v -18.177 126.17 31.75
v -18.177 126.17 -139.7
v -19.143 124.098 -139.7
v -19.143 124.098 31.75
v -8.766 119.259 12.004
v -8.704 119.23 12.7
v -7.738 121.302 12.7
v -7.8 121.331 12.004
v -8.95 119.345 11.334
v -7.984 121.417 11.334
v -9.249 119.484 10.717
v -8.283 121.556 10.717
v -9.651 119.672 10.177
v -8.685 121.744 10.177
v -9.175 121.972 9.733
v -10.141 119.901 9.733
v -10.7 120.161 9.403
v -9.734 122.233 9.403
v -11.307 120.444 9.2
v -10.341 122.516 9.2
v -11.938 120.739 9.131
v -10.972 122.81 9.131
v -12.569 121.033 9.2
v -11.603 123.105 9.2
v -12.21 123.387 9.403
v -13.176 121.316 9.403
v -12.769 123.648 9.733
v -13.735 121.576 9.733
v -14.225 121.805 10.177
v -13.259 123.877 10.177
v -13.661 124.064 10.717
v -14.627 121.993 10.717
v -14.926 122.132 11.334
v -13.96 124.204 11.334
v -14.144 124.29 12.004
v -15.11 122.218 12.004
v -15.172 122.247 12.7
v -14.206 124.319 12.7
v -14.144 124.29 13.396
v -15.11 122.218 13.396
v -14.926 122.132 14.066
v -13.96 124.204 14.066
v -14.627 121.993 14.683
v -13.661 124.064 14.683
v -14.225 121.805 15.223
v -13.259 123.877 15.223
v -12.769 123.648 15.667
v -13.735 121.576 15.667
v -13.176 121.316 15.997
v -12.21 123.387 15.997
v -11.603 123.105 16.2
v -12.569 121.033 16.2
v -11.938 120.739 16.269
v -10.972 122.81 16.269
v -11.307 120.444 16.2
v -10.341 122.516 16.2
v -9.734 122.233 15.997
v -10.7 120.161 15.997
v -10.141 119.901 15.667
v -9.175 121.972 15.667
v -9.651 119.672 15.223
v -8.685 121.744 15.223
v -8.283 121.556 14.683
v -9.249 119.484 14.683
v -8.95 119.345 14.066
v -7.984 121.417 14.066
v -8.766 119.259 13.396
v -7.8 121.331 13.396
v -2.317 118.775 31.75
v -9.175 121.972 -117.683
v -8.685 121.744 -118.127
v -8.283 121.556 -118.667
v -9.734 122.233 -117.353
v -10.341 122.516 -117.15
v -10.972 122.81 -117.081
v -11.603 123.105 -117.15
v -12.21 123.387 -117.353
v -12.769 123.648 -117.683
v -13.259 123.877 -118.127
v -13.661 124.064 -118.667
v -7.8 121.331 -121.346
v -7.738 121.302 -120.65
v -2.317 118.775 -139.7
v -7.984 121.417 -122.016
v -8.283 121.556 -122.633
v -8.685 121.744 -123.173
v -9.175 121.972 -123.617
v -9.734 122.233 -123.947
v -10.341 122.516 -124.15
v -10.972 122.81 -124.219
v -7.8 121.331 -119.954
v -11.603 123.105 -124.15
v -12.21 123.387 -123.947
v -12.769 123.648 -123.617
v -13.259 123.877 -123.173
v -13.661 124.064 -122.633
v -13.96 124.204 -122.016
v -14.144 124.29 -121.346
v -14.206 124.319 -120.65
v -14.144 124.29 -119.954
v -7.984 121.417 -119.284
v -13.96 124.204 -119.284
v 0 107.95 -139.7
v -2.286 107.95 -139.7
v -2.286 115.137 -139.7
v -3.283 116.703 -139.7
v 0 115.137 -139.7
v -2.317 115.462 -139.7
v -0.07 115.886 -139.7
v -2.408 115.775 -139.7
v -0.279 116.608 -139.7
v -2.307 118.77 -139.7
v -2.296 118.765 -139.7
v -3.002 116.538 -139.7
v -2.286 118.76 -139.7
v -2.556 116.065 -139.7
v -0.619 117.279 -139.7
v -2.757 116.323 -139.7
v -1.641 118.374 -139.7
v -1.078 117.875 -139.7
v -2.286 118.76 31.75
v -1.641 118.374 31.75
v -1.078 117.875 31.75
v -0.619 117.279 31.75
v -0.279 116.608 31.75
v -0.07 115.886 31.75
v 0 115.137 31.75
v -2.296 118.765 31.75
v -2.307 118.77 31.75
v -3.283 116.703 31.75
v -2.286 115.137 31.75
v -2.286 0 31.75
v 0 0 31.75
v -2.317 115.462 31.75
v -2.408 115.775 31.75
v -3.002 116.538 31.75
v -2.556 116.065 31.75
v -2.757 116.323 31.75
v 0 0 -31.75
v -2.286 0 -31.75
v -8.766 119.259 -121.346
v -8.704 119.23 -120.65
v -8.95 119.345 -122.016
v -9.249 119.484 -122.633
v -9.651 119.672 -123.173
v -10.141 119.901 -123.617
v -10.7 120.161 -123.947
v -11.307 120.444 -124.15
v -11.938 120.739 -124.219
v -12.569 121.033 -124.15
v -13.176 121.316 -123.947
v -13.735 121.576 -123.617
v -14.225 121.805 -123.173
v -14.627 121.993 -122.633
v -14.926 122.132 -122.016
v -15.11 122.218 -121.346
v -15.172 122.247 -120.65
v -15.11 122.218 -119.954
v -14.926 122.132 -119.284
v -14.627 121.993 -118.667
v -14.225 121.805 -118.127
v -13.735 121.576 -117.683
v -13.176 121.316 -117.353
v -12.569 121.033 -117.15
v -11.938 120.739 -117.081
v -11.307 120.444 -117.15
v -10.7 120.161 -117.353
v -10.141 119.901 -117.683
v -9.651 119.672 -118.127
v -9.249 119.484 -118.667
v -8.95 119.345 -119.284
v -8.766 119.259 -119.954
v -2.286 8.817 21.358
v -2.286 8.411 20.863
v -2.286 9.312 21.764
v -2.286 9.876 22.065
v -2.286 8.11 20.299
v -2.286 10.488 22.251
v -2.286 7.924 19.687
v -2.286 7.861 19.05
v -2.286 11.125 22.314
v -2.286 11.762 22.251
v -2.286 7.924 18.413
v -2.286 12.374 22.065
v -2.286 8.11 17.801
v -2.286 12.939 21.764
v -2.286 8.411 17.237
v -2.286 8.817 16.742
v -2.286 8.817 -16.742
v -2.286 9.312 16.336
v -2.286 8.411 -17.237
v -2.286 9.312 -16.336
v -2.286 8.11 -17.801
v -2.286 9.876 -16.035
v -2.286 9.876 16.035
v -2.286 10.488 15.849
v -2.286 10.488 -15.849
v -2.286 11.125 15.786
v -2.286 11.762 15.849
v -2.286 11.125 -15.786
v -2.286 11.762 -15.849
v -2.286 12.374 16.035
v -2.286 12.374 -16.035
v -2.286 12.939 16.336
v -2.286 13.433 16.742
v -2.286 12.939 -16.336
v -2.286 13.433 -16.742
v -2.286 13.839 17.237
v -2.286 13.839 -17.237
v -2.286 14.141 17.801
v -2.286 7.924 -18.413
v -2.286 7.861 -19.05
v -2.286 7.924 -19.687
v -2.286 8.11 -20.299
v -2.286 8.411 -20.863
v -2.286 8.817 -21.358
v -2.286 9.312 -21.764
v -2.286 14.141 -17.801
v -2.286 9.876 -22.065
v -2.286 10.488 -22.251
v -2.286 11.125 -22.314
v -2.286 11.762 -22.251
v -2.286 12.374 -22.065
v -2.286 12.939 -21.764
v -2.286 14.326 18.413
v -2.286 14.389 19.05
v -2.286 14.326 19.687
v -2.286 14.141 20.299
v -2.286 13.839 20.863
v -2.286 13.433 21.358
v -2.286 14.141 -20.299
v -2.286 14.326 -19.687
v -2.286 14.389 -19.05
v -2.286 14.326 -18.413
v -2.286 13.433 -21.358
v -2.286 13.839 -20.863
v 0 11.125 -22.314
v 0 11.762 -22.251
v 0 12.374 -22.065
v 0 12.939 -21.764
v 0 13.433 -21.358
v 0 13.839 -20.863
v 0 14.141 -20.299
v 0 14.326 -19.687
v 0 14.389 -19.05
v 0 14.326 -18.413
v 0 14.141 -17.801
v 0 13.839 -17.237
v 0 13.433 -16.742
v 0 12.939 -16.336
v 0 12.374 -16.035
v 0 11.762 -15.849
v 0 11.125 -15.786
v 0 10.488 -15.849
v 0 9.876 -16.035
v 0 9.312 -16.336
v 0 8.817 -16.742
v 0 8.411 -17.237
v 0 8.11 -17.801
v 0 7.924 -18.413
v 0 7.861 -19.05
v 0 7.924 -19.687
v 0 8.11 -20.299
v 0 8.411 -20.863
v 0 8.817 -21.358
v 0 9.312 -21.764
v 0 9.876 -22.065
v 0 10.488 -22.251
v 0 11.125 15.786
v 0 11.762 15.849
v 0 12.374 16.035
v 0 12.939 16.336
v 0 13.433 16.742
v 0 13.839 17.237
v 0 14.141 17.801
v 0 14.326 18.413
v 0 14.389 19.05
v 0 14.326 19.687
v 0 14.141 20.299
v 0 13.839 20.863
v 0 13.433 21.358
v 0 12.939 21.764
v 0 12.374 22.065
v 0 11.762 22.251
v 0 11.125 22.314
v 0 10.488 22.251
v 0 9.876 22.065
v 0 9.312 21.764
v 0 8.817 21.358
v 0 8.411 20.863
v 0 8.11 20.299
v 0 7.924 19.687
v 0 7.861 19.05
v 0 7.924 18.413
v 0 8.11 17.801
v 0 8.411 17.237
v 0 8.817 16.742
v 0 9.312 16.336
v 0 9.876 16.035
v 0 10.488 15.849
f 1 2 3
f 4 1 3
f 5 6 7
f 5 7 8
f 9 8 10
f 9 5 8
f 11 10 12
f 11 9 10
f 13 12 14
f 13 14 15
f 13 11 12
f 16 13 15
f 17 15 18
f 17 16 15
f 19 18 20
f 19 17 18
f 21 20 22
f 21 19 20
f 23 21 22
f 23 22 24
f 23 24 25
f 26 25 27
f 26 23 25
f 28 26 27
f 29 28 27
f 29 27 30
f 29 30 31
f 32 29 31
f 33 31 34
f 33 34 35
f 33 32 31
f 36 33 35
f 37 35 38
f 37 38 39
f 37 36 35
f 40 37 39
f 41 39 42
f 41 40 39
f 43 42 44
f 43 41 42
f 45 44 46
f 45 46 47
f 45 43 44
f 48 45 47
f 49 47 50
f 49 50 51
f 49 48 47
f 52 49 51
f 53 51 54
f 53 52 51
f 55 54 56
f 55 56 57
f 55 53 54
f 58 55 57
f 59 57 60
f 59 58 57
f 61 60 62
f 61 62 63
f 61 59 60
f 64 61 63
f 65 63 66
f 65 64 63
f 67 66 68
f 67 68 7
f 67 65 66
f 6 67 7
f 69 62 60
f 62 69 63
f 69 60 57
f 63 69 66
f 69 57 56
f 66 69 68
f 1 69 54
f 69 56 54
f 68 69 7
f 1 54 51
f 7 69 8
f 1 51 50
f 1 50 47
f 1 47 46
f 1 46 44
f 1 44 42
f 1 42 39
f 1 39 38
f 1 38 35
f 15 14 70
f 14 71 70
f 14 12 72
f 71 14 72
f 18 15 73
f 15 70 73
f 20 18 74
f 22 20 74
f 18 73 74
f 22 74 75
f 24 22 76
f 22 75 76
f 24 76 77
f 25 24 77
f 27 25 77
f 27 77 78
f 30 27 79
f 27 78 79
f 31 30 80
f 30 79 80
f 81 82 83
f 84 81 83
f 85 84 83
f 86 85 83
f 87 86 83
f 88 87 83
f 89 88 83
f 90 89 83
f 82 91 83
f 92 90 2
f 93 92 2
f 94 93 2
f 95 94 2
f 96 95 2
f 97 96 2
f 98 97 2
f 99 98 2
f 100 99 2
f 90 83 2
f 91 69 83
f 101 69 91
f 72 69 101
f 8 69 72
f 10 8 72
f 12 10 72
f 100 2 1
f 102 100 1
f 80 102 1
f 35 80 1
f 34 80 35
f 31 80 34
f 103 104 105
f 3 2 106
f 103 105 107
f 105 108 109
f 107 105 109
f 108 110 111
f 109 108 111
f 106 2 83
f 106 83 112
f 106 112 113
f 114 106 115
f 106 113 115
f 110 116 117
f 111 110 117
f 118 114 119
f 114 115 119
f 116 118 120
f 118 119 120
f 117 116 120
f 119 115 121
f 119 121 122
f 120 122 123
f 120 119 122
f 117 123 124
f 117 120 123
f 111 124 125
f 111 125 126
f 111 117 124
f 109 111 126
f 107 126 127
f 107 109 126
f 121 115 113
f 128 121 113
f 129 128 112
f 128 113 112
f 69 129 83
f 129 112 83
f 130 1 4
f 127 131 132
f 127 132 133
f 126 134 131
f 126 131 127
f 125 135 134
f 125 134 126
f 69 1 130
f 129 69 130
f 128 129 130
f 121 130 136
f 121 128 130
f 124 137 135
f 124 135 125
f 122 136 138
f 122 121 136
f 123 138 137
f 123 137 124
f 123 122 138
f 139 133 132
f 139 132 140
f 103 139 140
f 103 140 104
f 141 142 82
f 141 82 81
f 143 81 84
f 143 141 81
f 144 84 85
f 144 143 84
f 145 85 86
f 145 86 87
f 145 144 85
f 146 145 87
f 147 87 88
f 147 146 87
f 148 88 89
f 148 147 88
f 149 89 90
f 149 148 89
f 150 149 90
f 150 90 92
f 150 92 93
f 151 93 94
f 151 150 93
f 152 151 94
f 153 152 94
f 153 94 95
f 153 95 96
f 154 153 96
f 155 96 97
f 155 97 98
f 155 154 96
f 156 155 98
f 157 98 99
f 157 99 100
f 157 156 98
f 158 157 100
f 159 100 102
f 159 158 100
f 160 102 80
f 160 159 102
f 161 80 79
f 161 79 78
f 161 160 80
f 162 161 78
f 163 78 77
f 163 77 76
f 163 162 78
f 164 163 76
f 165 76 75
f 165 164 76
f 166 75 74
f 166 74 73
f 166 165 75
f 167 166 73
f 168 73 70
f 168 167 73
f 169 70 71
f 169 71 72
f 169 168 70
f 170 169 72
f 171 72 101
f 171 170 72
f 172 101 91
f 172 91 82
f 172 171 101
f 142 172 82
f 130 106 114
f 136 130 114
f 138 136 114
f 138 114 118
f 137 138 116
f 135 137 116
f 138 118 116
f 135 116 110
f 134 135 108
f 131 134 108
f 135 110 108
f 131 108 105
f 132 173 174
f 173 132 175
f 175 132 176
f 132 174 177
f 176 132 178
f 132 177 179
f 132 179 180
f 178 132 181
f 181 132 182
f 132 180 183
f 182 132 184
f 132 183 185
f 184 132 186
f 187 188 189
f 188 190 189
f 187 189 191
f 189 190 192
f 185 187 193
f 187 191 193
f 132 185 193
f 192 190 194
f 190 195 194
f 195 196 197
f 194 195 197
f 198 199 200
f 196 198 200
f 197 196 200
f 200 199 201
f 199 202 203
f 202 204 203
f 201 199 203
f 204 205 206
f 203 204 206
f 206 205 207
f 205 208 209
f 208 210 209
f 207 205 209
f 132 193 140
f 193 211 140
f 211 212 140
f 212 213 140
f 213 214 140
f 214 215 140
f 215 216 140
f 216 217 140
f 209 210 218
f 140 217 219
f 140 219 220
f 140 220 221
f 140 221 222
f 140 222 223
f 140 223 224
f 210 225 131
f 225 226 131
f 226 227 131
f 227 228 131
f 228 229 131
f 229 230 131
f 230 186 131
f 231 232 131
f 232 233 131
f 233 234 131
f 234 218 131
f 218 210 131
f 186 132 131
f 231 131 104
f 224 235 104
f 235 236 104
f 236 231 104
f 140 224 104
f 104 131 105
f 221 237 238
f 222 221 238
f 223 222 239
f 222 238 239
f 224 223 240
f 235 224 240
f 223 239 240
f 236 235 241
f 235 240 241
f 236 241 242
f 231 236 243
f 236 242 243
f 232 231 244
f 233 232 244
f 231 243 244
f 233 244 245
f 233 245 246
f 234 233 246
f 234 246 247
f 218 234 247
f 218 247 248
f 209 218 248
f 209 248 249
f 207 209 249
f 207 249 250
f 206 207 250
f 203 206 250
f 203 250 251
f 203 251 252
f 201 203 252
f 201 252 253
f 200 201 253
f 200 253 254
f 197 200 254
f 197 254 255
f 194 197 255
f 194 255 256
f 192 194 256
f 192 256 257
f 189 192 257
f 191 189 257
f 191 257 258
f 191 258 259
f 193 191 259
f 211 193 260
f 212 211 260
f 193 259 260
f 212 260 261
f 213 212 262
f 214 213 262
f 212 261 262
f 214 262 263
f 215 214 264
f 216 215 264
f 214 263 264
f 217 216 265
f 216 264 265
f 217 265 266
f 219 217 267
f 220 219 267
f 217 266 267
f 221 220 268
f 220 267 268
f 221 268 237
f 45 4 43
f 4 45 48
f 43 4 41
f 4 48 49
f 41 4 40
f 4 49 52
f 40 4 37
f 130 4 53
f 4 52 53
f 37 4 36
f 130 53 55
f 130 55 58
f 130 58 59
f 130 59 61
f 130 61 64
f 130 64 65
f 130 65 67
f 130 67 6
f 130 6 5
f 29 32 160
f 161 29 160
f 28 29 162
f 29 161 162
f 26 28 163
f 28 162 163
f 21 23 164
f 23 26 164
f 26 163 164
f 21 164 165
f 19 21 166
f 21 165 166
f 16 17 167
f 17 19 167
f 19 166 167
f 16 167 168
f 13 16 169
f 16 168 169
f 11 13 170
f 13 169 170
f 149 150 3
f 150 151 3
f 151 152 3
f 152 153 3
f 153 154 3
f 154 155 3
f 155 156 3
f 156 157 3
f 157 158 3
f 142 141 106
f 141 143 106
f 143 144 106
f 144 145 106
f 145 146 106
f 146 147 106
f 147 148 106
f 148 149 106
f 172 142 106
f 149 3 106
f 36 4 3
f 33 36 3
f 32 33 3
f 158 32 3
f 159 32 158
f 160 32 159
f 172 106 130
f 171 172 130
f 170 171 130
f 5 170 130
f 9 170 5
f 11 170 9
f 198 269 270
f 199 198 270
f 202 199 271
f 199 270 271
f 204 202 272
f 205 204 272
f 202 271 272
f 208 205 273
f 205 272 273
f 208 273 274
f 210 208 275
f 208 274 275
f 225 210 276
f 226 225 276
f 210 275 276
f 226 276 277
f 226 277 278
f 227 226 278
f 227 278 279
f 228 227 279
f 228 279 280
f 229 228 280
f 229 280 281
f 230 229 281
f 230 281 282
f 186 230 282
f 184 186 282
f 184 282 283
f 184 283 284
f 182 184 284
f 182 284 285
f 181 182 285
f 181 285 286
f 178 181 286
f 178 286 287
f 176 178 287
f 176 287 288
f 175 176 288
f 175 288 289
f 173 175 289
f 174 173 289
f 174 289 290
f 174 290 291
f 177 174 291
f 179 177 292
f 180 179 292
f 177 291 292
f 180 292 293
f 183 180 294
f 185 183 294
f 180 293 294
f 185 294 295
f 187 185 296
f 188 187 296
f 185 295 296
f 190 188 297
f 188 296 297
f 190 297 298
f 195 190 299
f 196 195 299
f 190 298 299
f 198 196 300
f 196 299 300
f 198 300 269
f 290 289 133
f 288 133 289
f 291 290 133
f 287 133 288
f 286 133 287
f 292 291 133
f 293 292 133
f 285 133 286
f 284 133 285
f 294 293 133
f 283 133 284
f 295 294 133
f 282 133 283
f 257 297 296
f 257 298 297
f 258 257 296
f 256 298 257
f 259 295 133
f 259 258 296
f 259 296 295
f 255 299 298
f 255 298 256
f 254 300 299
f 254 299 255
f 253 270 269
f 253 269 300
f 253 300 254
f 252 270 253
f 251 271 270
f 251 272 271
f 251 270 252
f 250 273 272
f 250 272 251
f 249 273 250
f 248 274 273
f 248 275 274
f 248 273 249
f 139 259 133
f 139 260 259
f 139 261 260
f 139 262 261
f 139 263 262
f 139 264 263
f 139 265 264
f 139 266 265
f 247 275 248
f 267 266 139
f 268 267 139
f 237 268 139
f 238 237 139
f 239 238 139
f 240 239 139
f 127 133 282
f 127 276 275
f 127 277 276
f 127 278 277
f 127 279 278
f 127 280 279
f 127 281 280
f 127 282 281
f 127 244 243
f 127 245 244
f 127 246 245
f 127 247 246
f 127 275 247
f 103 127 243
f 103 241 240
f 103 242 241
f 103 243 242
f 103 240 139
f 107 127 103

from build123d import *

# Parameters (mm, degrees)
BASE_FLANGE1_DEPTH         = 2.286
CUT_EXTRUDE1_REACH         = 196.797
SKETCH4_R                  = 3.2639
SKETCH4_R_2                = 3.5687
SKETCHED_START             = 119.049056405
SKETCHED_BEND2_OUTLINE_R   = 3.5687
SKETCHED_BEND2_DEPTH       = 4.950943595
SKETCHED_START_2           = -139.7
SKETCHED_BEND2_2_DEPTH     = 171.45
SKETCHED_BEND2_3_DEPTH     = 171.45
SKETCHED_START_3           = 104.381009176
SKETCHED_BEND2_4_OUTLINE_R = 3.5687
SKETCHED_BEND2_4_DEPTH     = 2.286


with BuildPart() as part:
    # Base-Flange1: sheet metal written as solids
    # Sketch2 → Base-Flange1 (new body)
    with BuildSketch(Plane(origin=(0, 0, 0), x_dir=(0, 0, -1), z_dir=(1, 0, 0))):
        Polygon((-31.75, 0), (31.75, 0), (139.7, 107.95), (139.7, 135.7376), (-31.75, 135.7376), align=None)
    extrude(amount=-BASE_FLANGE1_DEPTH)

    # Sketch4 → Cut-Extrude1 (cut, up to next)
    with BuildSketch(Plane(origin=(0, 0, 0), x_dir=(0, 0, -1), z_dir=(1, 0, 0)), mode=Mode.PRIVATE) as cut_extrude1_sk1:
        with Locations((19.05, 11.1252)):
            Circle(SKETCH4_R)
    cut_extrude1_tool1 = extrude(cut_extrude1_sk1.sketch, amount=-CUT_EXTRUDE1_REACH, mode=Mode.PRIVATE) & part.part
    # Sketch4 → Cut-Extrude1 (cut, up to next)
    with BuildSketch(Plane(origin=(0, 0, 0), x_dir=(0, 0, -1), z_dir=(1, 0, 0)), mode=Mode.PRIVATE) as cut_extrude1_sk2:
        with Locations((-19.05, 11.1252)):
            Circle(SKETCH4_R)
    cut_extrude1_tool2 = extrude(cut_extrude1_sk2.sketch, amount=-CUT_EXTRUDE1_REACH, mode=Mode.PRIVATE) & part.part
    # Sketch4 → Cut-Extrude1 (cut, up to next)
    with BuildSketch(Plane(origin=(0, 0, 0), x_dir=(0, 0, -1), z_dir=(1, 0, 0)), mode=Mode.PRIVATE) as cut_extrude1_sk3:
        with Locations((-12.7, 127.7874)):
            Circle(SKETCH4_R_2)
    cut_extrude1_tool3 = extrude(cut_extrude1_sk3.sketch, amount=-CUT_EXTRUDE1_REACH, mode=Mode.PRIVATE) & part.part
    # Sketch4 → Cut-Extrude1 (cut, up to next)
    with BuildSketch(Plane(origin=(0, 0, 0), x_dir=(0, 0, -1), z_dir=(1, 0, 0)), mode=Mode.PRIVATE) as cut_extrude1_sk4:
        with Locations((120.65, 127.7874)):
            Circle(SKETCH4_R_2)
    cut_extrude1_tool4 = extrude(cut_extrude1_sk4.sketch, amount=-CUT_EXTRUDE1_REACH, mode=Mode.PRIVATE) & part.part
    add(cut_extrude1_tool1.solids().sort_by_distance((0, 11.1252, -19.05))[0], mode=Mode.SUBTRACT)
    add(cut_extrude1_tool2.solids().sort_by_distance((0, 11.1252, 19.05))[0], mode=Mode.SUBTRACT)
    add(cut_extrude1_tool3.solids().sort_by_distance((0, 127.7874, 12.7))[0], mode=Mode.SUBTRACT)
    add(cut_extrude1_tool4.solids().sort_by_distance((0, 127.7874, -120.65))[0], mode=Mode.SUBTRACT)

    # Sketched Bend2: read off the stored shape, not the designer's step
    # Sketched Bend2 outline → Sketched Bend2 (cut)
    with BuildSketch(Plane(origin=(0, 0, 0), x_dir=(0.906307787036651, -0.42261826174069705, 0), z_dir=(0.42261826174069705, 0.9063077870366512, 0)).offset(SKETCHED_START)):
        with Locations((-61.845865858, -12.7)):
            Circle(SKETCHED_BEND2_OUTLINE_R)
        with Locations((-61.845865858, 120.65)):
            Circle(SKETCHED_BEND2_OUTLINE_R)
    extrude(amount=SKETCHED_BEND2_DEPTH, mode=Mode.SUBTRACT)

    # Sketched Bend2 2 outline → Sketched Bend2 2 (cut)
    with BuildSketch(Plane.XY.offset(SKETCHED_START_2)):
        with BuildLine():
            Line((-2.286, 135.7376), (-2.286, 118.759838882))
            ThreePointArc((-2.286, 118.759838882), (-0.619280932, 117.279080961), (0, 115.137332236))
            Line((0, 115.137332236), (0, 135.7376))
            Line((0, 135.7376), (-2.286, 135.7376))
        make_face()
    extrude(amount=SKETCHED_BEND2_2_DEPTH, mode=Mode.SUBTRACT)

    # Sketched Bend2 3 outline → Sketched Bend2 3 (add)
    with BuildSketch(Plane.XY.offset(SKETCHED_START_2)):
        with BuildLine():
            Line((-19.143397335, 124.098413464), (-3.283253738, 116.702707046))
            ThreePointArc((-3.283253738, 116.702707046), (-2.556494295, 116.065356119), (-2.286, 115.137332236))
            Line((-2.286, 115.137332236), (-2.286, 118.759838882))
            ThreePointArc((-2.286, 118.759838882), (-2.301558441, 118.767216176), (-2.317148392, 118.774526647))
            Line((-2.317148392, 118.774526647), (-18.177291988, 126.170233065))
            Line((-18.177291988, 126.170233065), (-19.143397335, 124.098413464))
        make_face()
    extrude(amount=SKETCHED_BEND2_3_DEPTH)

    # Sketched Bend2 4 outline → Sketched Bend2 4 (cut)
    with BuildSketch(Plane(origin=(0, 0, 0), x_dir=(0.906307787036651, -0.42261826174069705, 0), z_dir=(0.42261826174069705, 0.9063077870366512, 0)).offset(SKETCHED_START_3)):
        with Locations((-61.845865858, -12.7)):
            Circle(SKETCHED_BEND2_4_OUTLINE_R)
        with Locations((-61.845865858, 120.65)):
            Circle(SKETCHED_BEND2_4_OUTLINE_R)
    extrude(amount=SKETCHED_BEND2_4_DEPTH, mode=Mode.SUBTRACT)


solid = part.part
